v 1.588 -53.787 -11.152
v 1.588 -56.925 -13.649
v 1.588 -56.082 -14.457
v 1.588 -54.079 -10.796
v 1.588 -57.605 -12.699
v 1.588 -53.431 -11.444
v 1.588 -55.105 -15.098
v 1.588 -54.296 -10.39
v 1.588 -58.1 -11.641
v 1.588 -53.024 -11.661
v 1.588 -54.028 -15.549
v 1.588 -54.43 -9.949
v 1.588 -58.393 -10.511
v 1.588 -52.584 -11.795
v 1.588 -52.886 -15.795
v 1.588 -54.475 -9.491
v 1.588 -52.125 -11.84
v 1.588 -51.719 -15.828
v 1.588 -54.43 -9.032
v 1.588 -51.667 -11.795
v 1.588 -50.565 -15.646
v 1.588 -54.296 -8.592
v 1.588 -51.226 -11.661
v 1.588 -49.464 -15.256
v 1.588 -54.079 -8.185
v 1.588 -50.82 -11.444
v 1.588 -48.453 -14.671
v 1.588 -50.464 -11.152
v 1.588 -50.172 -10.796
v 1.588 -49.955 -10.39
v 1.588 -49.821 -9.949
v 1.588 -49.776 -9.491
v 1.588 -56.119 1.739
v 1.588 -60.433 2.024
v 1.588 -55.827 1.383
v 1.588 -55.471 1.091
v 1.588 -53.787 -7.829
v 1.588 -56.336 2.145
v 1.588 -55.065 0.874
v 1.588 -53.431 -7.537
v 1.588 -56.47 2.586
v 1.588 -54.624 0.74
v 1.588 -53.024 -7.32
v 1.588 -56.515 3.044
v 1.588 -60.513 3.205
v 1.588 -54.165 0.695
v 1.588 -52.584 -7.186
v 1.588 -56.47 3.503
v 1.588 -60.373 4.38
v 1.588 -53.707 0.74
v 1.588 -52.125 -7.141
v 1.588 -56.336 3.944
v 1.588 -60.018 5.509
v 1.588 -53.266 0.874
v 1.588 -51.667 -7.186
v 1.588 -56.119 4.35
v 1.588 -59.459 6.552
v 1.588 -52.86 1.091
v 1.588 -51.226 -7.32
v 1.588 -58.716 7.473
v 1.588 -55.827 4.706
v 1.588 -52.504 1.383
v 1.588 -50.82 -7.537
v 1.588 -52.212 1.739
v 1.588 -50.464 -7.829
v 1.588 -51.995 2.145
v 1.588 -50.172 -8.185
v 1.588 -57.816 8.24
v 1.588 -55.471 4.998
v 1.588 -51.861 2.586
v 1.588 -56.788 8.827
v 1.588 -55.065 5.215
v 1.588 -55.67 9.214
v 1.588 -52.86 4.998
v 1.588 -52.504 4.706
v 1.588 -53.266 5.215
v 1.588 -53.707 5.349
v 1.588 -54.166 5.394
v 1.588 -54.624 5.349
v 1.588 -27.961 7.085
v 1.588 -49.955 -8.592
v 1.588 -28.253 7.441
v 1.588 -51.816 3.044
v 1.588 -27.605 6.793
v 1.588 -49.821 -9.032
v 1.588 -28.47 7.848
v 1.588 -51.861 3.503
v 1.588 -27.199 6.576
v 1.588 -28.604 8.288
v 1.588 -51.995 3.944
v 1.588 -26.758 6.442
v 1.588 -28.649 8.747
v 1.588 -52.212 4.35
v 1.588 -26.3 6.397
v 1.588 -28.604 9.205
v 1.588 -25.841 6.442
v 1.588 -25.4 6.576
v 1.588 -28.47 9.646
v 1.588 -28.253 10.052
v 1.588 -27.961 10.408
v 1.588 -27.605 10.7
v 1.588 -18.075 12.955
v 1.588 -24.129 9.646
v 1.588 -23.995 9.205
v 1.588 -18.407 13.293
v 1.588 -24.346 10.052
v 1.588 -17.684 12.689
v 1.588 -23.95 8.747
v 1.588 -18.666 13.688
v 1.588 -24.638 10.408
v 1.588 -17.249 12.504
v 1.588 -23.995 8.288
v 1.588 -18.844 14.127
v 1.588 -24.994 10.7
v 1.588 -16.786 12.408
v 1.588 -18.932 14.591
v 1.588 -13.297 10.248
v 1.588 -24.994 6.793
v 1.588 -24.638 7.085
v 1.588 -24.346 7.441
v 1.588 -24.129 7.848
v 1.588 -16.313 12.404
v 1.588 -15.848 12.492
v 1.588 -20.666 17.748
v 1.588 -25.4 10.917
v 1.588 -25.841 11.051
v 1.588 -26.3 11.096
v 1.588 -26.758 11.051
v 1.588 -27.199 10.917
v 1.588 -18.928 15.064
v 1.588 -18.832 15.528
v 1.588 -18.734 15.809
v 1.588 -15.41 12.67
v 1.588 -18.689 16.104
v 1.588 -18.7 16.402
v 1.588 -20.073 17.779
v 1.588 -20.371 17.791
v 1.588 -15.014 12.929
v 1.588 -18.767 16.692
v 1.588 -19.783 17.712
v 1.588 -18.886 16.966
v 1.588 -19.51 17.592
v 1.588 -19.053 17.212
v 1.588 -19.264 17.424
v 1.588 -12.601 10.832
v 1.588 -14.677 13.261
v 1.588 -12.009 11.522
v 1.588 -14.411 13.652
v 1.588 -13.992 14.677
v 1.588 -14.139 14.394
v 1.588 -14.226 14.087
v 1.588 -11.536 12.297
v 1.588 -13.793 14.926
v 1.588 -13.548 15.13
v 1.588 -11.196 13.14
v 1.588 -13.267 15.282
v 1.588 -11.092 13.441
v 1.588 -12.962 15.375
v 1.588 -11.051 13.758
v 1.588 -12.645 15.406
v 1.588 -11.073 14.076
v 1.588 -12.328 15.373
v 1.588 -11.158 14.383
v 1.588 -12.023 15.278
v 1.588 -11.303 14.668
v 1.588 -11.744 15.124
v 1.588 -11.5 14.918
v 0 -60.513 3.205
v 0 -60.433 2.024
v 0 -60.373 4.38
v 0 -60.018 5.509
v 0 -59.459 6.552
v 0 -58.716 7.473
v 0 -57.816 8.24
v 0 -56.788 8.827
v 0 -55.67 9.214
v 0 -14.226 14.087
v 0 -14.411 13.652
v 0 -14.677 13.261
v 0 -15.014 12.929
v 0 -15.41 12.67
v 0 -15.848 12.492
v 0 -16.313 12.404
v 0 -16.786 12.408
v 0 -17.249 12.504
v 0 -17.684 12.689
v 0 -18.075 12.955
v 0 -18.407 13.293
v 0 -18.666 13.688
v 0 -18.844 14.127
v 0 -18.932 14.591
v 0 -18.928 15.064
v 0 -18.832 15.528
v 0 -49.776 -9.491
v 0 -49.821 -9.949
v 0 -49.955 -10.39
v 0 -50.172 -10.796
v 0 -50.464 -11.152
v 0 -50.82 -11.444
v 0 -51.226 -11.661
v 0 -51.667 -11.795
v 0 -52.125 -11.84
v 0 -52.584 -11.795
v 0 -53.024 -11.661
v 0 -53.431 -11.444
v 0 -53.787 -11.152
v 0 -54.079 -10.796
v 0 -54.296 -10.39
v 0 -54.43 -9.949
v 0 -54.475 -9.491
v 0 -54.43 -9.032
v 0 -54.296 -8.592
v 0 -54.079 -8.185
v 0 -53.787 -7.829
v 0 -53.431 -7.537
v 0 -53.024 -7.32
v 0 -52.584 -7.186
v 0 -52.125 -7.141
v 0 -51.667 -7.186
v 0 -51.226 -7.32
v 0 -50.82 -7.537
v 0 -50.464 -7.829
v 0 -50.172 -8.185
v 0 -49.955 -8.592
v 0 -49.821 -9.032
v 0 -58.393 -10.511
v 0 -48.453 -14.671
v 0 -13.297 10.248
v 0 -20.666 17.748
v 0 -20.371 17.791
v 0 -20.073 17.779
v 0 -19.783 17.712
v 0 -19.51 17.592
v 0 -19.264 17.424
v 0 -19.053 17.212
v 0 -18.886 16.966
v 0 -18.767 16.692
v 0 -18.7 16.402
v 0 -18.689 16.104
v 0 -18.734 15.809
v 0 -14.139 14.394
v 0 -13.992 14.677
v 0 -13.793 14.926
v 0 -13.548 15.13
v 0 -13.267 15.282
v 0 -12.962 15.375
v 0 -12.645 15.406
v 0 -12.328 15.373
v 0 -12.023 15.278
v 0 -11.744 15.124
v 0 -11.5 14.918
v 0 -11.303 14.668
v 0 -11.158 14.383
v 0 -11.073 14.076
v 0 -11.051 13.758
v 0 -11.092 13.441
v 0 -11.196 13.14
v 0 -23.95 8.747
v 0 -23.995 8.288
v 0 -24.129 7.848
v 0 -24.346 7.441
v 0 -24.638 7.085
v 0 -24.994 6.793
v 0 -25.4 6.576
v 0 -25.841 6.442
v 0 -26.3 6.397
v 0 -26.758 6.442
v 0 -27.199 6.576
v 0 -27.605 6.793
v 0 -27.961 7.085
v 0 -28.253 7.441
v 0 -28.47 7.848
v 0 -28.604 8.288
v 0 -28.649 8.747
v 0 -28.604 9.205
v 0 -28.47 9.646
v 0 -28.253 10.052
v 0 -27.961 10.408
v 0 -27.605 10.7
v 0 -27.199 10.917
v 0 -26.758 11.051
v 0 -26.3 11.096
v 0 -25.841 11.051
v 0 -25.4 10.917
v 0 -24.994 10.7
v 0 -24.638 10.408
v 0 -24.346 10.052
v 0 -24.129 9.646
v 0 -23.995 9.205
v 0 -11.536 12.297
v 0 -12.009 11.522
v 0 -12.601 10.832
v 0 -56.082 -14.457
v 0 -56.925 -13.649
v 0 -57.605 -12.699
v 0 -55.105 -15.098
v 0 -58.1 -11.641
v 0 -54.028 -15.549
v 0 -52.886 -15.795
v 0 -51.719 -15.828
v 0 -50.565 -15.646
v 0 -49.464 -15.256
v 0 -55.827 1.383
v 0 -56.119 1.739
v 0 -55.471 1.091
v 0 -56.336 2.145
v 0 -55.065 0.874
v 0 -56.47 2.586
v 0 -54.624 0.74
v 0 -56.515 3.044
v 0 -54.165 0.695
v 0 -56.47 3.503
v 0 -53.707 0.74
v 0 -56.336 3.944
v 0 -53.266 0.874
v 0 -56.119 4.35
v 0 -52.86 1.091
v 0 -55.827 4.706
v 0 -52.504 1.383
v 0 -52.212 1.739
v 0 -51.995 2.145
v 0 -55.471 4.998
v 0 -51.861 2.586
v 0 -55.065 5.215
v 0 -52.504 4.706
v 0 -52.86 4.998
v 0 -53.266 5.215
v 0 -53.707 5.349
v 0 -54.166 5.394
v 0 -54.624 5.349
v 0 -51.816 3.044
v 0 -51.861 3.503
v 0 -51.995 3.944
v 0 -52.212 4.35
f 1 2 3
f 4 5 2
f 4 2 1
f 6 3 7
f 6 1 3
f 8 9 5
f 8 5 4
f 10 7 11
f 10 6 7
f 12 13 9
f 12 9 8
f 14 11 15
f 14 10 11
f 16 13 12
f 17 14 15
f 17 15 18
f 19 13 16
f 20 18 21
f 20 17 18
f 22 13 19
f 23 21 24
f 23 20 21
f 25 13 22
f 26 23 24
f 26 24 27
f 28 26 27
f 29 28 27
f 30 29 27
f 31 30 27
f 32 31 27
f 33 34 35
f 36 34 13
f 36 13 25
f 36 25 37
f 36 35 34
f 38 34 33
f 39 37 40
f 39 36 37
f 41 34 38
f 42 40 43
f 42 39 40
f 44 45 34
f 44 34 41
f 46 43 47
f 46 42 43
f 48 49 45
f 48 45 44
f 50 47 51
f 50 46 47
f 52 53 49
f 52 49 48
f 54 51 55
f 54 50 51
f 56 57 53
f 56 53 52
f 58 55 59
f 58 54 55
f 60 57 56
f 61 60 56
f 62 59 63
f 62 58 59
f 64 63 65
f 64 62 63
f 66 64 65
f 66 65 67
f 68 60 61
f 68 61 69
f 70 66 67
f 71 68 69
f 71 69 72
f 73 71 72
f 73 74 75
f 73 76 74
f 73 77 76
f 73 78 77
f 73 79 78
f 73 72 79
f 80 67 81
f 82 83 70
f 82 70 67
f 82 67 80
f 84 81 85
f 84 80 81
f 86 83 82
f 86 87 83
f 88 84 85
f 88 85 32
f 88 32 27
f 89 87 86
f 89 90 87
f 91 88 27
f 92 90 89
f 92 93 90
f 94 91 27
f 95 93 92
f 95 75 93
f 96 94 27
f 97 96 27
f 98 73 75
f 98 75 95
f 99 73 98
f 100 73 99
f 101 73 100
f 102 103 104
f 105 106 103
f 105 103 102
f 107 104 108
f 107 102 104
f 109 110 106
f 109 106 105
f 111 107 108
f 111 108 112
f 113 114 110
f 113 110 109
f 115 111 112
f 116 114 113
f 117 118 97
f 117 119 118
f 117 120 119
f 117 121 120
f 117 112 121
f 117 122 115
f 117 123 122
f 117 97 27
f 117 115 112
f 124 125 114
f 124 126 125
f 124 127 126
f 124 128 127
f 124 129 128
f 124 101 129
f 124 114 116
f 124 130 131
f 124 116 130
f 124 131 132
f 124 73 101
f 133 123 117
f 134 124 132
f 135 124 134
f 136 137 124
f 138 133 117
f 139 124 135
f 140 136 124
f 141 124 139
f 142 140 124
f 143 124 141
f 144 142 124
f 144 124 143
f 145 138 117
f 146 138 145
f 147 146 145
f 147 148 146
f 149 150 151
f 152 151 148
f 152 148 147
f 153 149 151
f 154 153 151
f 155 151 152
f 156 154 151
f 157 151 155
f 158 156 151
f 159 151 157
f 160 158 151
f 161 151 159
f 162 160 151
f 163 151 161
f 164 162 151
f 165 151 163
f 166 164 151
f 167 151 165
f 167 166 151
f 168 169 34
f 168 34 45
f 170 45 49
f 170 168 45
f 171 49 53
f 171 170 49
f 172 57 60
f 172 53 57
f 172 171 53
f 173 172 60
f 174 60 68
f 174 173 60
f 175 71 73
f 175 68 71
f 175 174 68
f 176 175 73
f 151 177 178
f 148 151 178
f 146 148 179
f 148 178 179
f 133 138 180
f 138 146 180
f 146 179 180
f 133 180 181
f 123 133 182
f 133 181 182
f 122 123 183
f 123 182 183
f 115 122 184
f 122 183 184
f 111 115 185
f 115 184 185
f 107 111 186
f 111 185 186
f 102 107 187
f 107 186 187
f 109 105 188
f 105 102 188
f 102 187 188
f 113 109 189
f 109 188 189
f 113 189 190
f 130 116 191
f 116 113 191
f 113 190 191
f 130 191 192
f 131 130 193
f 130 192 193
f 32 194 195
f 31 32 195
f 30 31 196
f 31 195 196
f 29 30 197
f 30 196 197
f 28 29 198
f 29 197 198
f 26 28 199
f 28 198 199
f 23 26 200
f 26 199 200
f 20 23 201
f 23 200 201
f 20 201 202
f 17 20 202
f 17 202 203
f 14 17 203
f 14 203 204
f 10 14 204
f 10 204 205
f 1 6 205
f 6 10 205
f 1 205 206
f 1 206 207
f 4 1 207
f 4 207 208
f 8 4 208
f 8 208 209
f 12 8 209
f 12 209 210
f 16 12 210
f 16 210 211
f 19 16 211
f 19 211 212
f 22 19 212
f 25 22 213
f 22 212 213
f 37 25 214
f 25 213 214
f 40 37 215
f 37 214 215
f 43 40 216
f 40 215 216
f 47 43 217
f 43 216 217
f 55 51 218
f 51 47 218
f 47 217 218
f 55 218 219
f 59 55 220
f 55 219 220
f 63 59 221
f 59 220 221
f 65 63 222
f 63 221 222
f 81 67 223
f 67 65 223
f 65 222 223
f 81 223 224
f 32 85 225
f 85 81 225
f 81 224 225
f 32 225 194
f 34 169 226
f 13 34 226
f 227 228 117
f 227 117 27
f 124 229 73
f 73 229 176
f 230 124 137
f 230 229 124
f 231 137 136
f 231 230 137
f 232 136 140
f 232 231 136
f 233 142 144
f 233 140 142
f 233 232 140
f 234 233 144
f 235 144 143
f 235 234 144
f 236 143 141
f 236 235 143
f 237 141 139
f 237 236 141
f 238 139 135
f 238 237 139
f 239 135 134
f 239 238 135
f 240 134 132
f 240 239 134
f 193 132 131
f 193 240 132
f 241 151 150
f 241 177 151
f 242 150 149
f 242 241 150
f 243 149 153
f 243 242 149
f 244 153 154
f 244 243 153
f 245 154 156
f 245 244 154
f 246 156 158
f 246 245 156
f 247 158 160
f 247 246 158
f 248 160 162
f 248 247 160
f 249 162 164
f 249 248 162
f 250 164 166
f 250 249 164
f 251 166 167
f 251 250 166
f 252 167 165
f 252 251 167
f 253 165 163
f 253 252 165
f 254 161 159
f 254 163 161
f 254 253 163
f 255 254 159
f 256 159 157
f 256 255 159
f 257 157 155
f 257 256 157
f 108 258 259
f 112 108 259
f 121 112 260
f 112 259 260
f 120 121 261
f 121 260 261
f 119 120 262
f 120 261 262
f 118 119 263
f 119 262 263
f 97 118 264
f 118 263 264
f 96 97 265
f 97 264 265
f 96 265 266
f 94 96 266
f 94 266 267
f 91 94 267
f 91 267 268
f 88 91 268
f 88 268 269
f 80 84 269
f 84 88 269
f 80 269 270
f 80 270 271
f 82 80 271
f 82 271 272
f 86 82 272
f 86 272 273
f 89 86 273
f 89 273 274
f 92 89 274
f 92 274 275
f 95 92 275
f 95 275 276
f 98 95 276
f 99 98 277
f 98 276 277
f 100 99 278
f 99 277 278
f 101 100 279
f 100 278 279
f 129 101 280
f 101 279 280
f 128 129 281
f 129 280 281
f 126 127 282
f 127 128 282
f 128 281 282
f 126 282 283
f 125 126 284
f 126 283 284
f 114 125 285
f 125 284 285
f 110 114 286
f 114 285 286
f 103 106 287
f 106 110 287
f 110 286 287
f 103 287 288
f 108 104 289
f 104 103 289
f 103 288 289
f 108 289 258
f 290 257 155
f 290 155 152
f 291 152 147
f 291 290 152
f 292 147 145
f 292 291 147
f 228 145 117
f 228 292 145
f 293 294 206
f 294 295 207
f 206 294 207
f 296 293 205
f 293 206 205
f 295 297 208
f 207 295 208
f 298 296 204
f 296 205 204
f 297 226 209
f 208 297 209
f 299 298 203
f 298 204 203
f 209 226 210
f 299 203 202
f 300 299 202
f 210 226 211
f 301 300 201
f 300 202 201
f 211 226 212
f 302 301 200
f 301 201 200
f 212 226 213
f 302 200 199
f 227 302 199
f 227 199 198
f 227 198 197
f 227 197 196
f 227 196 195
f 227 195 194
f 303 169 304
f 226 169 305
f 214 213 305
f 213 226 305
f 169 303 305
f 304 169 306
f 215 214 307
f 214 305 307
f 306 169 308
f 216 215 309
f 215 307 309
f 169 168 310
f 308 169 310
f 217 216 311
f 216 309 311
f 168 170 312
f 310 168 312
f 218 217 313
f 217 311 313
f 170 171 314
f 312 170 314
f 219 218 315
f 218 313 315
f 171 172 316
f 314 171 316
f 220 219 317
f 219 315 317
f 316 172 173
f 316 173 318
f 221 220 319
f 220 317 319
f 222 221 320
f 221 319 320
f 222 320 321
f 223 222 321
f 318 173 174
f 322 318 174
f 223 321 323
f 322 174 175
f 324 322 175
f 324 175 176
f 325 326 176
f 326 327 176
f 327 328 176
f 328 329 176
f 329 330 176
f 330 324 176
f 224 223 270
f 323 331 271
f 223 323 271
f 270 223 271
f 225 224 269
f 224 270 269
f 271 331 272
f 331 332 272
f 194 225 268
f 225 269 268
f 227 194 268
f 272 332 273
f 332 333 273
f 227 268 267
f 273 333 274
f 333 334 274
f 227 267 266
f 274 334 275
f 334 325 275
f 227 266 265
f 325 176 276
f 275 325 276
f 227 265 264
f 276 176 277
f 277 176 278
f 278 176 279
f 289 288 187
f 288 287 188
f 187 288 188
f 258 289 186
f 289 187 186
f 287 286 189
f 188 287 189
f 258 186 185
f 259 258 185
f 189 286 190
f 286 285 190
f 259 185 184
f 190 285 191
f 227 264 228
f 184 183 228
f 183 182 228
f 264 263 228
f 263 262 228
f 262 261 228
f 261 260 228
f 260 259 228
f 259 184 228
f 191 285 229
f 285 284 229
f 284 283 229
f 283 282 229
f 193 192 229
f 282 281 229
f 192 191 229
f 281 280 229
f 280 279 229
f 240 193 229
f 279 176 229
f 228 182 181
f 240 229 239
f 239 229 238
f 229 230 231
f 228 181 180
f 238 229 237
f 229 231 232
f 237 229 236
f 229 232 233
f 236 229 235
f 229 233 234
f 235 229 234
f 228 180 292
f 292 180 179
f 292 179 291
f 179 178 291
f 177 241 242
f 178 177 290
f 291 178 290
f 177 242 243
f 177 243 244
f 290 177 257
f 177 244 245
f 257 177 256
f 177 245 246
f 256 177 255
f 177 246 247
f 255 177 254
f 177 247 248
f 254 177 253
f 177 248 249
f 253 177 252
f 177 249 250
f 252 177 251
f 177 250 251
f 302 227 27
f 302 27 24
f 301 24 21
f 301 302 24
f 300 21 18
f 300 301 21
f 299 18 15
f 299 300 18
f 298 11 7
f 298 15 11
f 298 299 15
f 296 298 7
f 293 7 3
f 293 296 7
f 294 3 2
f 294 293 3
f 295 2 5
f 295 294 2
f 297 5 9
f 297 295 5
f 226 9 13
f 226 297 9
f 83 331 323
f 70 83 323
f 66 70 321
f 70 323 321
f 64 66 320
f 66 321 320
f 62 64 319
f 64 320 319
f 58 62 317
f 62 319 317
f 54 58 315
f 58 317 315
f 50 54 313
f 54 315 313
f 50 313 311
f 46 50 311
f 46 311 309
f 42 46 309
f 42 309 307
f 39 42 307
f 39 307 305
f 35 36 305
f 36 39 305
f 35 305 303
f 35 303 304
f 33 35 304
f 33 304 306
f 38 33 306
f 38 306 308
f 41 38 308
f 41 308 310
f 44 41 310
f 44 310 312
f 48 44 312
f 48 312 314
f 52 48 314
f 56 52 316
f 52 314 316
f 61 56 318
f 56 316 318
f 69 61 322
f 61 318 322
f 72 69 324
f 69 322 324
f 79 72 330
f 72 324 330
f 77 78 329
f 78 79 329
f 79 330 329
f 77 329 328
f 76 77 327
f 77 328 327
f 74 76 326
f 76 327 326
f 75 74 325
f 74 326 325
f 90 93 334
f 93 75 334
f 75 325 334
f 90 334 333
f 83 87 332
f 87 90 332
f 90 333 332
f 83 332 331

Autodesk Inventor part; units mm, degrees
ref_plane "YZ Plane" through (0, 0, 0) normal (1, 0, 0) x (0, 1, 0)
ref_plane "XZ Plane" through (0, 0, 0) normal (0, 1, 0) x (-1, 0, 0)
ref_plane "XY Plane" through (0, 0, 0) normal (0, 0, 1) x (1, 0, 0)
sketch "Sketch1" plane through (0, 0, 0) normal (1, 0, 0) x (0, 1, 0)
  circle A0 centre (-16.5288, 14.8074) radius 3.9624 construction
  circle A1 centre (-54.1655, 3.0444) radius 2.1844 construction
  circle A2 centre (-52.1252, -9.4907) radius 2.1844 construction
  circle A3 centre (-54.1655, 3.0444) radius 2.3495
  circle A4 centre (-52.1252, -9.4907) radius 2.3495
  circle A5 centre (-54.1655, 3.0444) radius 6.35
  circle A6 centre (-52.1252, -9.4907) radius 6.35
  line L0 (-60.433, 2.0242) -> (-58.3927, -10.5108)
  arc A7 (-18.8318, 15.5275) -> (-14.2258, 14.0872) centre (-16.5288, 14.8074) ccw
  line L1 (-16.5288, 14.8074) -> (-18.8318, 15.5275) construction
  line L2 (-16.5288, 14.8074) -> (-14.2258, 14.0872) construction
  arc A8 (-21.8622, 16.475) -> (-11.1955, 13.1397) centre (-16.5288, 14.8074) ccw
  line L3 (-11.1955, 13.1397) -> (-21.8622, 16.475)
  arc A9 (-11.1955, 13.1397) -> (-14.2258, 14.0872) centre (-12.6506, 13.8055) ccw
  arc A10 (-18.8318, 15.5275) -> (-21.8622, 16.475) centre (-20.287, 16.1933) ccw
  line L4 (-20.666, 17.748) -> (-55.6696, 9.2136)
  line L5 (-13.2973, 10.2485) -> (-48.4531, -14.6712)
  circle A11 centre (-26.2996, 8.7467) radius 2.3495
  point P0 (0, 0)
  point P1 (-18.8318, 15.5275)
  dimension "d0" = 4.699
  dimension "d1" = 4.699
  dimension "d4" = 12.7
  dimension "d5" = 12.7
  dimension "d6" = 2.413
  dimension "d7" = 180
  dimension "d8" = 3.175
  dimension "d9" = 1.6002
  dimension "d10" = 1.6002
  dimension "d11" = 4.699
extrude "Plate1" add sketch "Sketch1" along normal blind 1.5875 contours A5 | A5 L4 A10 A8 L5 A6 | A6 L0 A5 | A6 | A7 L3 A8
sheet face with bend "Face2" sketch "Sketch1" thickness 1.5875 toward (1, 0, 0) bend radius 1.5875 contours A10 L3 | A9 L3
bend "Bend1"
equation "\"d12\" = Thickness"
equation "\"d13\" = BendRadius"
equation "\"d14\" = BendReliefWidth"
equation "\"d16\" = MinimumRemnant"
equation "\"d15\" = BendReliefDepth"
equation "\"d17\" = TransitionRadius"
equation "\"BendRadius\" = Thickness"
equation "\"BendReliefWidth\" = Thickness"
equation "\"BendReliefDepth\" = 0.5 * Thickness"
equation "\"CornerReliefSize\" = 4 * Thickness"
equation "\"MinimumRemnant\" = 2 * Thickness"
equation "\"TransitionRadius\" = BendRadius"
equation "\"JacobiRadiusSize\" = BendRadius"
equation "\"GapSize\" = Thickness"
equation "\"Thickness\" = 1.5875"
properties part number "hangPin"
